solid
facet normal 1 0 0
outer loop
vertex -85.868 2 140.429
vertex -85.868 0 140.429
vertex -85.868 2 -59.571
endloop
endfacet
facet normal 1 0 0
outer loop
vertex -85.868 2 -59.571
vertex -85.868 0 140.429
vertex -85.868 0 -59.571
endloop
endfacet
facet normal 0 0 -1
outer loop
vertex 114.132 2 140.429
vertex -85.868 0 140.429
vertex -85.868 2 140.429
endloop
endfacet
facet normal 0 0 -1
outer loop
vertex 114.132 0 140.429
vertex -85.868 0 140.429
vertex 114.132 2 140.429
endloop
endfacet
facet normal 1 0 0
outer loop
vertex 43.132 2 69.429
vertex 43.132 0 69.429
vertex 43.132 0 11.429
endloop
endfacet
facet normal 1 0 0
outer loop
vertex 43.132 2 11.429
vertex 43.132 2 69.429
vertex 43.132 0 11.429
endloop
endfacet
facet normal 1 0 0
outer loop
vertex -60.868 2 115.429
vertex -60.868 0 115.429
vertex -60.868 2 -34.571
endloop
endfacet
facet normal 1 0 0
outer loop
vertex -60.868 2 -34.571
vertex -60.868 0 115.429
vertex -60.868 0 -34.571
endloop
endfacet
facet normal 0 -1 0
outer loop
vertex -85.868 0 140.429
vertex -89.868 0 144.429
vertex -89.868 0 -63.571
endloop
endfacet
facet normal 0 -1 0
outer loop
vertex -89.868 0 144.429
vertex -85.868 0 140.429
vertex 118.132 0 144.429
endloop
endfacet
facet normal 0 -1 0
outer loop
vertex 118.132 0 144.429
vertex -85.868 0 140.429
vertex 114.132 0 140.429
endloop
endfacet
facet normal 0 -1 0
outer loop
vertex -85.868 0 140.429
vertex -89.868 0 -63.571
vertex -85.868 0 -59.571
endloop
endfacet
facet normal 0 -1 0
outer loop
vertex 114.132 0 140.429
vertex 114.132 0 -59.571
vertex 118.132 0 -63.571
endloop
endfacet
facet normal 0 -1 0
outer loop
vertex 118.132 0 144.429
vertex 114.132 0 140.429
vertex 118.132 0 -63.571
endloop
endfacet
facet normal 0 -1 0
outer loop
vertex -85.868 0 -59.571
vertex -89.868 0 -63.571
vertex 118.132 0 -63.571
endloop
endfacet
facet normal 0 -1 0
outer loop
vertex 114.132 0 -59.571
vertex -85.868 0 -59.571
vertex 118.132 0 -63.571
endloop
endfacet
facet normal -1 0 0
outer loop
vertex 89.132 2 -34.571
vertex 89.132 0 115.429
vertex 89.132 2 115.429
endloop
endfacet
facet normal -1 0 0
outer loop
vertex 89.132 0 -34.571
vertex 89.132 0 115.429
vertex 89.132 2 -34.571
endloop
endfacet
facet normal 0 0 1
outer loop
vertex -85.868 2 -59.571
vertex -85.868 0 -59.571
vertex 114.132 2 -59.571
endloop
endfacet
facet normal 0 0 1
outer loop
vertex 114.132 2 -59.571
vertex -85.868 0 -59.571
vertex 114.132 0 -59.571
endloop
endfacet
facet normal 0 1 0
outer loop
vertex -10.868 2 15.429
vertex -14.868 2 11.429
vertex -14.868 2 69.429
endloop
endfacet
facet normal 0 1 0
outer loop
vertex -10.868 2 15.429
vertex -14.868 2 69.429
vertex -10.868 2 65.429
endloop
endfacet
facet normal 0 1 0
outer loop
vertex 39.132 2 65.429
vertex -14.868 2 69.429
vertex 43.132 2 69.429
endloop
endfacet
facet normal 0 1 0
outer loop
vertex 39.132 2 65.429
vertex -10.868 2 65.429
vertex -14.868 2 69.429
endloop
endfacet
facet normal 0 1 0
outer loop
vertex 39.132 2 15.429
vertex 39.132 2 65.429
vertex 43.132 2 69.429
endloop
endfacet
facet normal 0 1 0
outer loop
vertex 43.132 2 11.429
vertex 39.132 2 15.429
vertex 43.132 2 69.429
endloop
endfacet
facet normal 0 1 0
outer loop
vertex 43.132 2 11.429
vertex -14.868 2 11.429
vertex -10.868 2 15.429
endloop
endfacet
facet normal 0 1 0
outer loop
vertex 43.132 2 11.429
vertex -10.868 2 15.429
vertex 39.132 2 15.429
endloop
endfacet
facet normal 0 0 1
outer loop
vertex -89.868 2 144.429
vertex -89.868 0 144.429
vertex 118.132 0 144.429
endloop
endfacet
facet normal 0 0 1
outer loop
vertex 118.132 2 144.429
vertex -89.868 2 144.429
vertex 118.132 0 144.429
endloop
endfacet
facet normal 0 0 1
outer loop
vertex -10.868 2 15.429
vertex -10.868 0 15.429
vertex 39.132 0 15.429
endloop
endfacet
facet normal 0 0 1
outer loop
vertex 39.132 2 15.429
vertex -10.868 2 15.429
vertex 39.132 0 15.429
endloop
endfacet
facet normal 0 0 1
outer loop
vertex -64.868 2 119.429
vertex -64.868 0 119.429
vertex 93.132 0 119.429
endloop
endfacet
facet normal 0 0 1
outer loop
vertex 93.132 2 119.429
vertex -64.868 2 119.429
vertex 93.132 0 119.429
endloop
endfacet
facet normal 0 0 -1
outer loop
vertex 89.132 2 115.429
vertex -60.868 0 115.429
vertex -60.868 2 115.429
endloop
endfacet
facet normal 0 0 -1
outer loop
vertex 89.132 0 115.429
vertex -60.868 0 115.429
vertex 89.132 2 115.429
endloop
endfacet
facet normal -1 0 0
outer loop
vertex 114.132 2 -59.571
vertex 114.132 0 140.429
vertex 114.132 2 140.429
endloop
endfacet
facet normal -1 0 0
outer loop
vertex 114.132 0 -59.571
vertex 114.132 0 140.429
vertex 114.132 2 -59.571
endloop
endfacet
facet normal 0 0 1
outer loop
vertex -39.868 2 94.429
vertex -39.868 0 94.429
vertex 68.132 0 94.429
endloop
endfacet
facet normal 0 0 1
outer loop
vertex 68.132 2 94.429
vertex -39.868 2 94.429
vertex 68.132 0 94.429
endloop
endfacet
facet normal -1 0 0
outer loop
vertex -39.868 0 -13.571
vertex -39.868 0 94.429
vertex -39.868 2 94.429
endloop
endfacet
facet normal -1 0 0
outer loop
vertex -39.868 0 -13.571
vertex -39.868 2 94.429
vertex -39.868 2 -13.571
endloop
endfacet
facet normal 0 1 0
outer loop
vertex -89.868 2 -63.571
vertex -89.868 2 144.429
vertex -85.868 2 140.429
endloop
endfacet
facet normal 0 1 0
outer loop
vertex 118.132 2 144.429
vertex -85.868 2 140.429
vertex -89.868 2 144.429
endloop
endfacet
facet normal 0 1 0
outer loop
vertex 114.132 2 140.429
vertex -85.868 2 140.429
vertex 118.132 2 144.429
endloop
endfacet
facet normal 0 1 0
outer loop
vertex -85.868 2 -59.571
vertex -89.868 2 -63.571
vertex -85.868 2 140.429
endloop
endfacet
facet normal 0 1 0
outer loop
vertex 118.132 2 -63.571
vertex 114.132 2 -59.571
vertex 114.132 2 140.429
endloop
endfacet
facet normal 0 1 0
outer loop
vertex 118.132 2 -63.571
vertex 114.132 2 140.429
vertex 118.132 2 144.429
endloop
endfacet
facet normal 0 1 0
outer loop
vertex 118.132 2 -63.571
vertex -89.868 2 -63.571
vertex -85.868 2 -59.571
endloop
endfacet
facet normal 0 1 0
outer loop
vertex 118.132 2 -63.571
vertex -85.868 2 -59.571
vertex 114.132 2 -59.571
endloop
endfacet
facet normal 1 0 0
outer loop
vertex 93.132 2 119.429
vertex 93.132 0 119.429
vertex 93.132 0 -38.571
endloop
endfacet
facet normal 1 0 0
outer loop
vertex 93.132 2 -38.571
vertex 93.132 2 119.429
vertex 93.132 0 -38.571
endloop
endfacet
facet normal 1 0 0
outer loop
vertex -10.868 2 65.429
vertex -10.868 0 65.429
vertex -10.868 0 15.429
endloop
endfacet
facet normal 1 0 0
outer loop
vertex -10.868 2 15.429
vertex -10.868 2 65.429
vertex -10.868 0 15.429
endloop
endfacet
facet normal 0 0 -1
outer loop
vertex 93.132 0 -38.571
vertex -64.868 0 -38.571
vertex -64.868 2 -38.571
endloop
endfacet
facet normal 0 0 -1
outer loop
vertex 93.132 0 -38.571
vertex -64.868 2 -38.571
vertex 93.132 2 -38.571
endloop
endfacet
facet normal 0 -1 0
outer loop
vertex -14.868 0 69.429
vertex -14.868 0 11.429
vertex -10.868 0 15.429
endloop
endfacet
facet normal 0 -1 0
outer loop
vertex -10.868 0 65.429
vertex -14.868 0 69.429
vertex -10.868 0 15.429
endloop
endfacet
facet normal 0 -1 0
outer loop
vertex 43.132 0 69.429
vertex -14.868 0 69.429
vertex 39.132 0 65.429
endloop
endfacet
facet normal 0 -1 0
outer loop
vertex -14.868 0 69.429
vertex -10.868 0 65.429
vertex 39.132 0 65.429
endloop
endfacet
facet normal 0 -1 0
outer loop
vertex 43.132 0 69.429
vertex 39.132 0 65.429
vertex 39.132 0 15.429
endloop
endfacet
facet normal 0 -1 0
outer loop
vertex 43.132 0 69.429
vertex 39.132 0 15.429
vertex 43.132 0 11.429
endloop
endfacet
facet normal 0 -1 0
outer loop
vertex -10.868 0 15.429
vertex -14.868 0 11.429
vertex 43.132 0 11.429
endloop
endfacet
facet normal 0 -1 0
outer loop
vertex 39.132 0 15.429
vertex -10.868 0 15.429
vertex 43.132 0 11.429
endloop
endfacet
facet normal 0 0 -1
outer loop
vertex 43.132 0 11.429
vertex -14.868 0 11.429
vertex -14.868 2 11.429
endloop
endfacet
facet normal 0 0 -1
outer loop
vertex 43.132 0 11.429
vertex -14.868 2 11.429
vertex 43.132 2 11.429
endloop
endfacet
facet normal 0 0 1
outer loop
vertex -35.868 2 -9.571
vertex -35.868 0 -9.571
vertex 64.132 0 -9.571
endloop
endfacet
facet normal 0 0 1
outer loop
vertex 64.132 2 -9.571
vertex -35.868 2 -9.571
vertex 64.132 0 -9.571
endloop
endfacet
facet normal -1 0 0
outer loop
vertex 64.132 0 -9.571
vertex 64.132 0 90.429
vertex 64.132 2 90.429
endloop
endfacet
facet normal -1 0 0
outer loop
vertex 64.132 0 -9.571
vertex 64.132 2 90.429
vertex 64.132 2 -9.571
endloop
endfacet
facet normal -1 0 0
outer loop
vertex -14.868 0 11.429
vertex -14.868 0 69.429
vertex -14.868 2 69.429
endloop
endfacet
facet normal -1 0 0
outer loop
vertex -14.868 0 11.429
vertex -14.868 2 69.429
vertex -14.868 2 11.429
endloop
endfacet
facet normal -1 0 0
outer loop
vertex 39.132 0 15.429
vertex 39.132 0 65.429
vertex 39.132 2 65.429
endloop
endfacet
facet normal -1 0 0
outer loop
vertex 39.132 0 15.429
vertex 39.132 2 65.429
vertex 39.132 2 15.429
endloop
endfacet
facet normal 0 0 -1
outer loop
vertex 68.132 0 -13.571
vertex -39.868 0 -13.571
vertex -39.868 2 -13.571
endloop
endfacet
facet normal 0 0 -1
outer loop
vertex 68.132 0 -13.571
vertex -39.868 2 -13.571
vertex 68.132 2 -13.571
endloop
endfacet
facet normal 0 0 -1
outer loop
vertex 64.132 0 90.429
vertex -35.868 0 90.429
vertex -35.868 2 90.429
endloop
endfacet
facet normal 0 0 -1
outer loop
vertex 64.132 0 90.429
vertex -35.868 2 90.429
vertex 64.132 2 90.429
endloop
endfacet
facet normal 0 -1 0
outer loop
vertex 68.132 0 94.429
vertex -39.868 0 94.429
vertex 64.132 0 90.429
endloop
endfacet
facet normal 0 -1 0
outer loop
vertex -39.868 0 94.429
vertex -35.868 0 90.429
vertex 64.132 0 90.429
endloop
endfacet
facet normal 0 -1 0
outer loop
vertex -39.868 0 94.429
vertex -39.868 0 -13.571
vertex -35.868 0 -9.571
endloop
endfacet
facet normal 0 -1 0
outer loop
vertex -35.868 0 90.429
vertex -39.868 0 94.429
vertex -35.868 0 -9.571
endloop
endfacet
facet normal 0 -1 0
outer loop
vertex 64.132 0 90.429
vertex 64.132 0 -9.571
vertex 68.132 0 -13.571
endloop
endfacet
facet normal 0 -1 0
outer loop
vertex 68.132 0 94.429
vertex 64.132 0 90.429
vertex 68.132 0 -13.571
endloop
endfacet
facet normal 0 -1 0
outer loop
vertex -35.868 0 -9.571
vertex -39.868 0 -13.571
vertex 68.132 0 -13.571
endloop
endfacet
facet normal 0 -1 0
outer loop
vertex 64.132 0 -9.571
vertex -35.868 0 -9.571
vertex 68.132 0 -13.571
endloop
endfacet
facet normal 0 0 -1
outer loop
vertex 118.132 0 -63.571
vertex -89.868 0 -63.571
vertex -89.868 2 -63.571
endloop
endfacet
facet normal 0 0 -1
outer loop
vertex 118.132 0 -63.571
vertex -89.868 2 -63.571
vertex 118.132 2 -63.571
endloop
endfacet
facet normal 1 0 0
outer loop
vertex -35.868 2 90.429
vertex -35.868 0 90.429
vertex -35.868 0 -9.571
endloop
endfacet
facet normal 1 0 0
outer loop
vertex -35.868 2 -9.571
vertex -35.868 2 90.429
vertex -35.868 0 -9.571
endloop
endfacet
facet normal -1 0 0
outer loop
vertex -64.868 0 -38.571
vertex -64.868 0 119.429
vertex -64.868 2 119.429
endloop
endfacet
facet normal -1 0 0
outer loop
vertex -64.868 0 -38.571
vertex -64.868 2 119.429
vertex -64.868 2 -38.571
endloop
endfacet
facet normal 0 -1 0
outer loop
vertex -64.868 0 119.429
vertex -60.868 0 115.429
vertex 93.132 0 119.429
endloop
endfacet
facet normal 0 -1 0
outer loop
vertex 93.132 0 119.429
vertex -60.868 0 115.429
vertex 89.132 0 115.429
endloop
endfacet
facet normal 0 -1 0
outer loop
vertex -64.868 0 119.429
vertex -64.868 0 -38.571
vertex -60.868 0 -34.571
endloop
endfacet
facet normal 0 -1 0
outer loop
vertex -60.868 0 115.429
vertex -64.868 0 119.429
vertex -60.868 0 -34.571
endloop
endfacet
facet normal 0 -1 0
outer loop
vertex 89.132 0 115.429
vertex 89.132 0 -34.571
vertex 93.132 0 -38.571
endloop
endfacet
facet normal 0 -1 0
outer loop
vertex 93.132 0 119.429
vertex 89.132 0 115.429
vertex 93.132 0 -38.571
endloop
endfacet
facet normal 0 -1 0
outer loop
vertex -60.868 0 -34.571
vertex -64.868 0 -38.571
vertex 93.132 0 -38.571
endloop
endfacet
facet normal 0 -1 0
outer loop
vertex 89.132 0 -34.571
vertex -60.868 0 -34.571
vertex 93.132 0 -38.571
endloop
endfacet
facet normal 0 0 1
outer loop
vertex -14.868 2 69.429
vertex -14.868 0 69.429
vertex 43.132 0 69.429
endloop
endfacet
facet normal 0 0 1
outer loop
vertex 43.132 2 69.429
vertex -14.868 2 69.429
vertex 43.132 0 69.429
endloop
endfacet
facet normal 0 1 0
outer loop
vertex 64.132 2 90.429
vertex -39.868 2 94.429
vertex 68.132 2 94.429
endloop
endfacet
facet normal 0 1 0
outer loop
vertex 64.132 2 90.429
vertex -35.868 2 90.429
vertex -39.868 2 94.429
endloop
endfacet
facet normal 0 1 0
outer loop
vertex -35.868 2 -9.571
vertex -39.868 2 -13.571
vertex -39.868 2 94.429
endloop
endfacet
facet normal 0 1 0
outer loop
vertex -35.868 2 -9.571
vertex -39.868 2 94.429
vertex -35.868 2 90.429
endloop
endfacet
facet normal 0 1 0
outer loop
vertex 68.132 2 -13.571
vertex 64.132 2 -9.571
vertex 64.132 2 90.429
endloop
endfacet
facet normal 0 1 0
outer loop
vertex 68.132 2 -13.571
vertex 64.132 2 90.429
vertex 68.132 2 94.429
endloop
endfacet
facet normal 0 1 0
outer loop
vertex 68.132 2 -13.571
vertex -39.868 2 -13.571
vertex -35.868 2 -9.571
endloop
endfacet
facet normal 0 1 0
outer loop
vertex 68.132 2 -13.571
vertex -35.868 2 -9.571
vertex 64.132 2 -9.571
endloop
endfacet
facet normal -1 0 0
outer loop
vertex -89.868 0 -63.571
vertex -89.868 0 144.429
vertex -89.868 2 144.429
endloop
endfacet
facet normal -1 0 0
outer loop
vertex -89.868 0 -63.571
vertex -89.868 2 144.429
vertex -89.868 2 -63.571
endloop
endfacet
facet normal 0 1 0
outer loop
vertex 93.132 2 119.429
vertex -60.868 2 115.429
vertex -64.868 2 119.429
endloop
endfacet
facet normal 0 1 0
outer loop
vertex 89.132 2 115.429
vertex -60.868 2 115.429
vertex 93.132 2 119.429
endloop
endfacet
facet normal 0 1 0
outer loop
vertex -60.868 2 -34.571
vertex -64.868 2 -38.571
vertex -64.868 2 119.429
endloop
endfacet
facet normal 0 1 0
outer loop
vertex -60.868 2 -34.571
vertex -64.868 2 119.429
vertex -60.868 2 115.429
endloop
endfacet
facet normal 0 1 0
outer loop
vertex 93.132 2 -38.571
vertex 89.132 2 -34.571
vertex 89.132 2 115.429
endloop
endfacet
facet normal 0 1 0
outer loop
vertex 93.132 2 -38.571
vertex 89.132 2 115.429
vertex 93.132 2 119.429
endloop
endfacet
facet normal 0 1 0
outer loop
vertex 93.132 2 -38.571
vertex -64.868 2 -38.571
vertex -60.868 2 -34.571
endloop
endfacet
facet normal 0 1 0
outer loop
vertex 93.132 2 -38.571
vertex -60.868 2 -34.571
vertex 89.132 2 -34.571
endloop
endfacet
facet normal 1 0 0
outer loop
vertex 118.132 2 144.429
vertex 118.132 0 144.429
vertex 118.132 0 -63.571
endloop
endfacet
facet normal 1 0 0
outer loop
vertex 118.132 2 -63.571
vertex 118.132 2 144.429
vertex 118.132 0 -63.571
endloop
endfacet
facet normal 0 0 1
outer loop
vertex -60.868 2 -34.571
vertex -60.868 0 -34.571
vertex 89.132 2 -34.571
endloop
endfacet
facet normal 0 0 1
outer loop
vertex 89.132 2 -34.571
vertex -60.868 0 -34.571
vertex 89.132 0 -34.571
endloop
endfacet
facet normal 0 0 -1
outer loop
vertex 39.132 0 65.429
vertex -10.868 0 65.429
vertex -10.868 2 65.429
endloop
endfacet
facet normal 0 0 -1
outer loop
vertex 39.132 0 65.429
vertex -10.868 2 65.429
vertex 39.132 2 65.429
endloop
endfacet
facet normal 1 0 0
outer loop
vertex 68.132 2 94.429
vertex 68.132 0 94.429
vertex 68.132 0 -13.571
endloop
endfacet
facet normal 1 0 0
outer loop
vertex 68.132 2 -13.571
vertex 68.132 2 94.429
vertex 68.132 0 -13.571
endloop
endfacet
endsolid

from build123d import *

# Parameters (mm, degrees)
SKETCH1_W             = 208
SKETCH1_H             = 208
SKETCH1_W_2           = 200
SKETCH1_H_2           = 200
EXTRUDE_THIN1_DEPTH   = 2
SKETCH1_W_3           = 158
SKETCH1_H_3           = 158
SKETCH1_W_4           = 150
SKETCH1_H_4           = 150
EXTRUDE_THIN1_2_DEPTH = 2
SKETCH1_W_5           = 108
SKETCH1_H_5           = 108
SKETCH1_W_6           = 100
SKETCH1_H_6           = 100
EXTRUDE_THIN1_3_DEPTH = 2
SKETCH1_W_7           = 58
SKETCH1_H_7           = 58
SKETCH1_W_8           = 50
SKETCH1_H_8           = 50
EXTRUDE_THIN1_4_DEPTH = 2


with BuildPart() as part:
    # Sketch1 → Extrude-Thin1 (new body)
    with BuildSketch(Plane(origin=(0, 0, 0), x_dir=(1, 0, 0), z_dir=(0, 1, 0))):
        with Locations((14.132379249, -40.429338104)):
            Rectangle(SKETCH1_W, SKETCH1_H)
        with Locations((14.132379249, -40.429338104)):
            Rectangle(SKETCH1_W_2, SKETCH1_H_2, mode=Mode.SUBTRACT)
    extrude(amount=EXTRUDE_THIN1_DEPTH)


with BuildPart() as body_2:
    # Sketch1 → Extrude-Thin1 2 (new body)
    with BuildSketch(Plane(origin=(0, 0, 0), x_dir=(1, 0, 0), z_dir=(0, 1, 0))):
        with Locations((14.132379249, -40.429338104)):
            Rectangle(SKETCH1_W_3, SKETCH1_H_3)
        with Locations((14.132379249, -40.429338104)):
            Rectangle(SKETCH1_W_4, SKETCH1_H_4, mode=Mode.SUBTRACT)
    extrude(amount=EXTRUDE_THIN1_2_DEPTH)


with BuildPart() as body_3:
    # Sketch1 → Extrude-Thin1 3 (new body)
    with BuildSketch(Plane(origin=(0, 0, 0), x_dir=(1, 0, 0), z_dir=(0, 1, 0))):
        with Locations((14.132379249, -40.429338104)):
            Rectangle(SKETCH1_W_5, SKETCH1_H_5)
        with Locations((14.132379249, -40.429338104)):
            Rectangle(SKETCH1_W_6, SKETCH1_H_6, mode=Mode.SUBTRACT)
    extrude(amount=EXTRUDE_THIN1_3_DEPTH)


with BuildPart() as body_4:
    # Sketch1 → Extrude-Thin1 4 (new body)
    with BuildSketch(Plane(origin=(0, 0, 0), x_dir=(1, 0, 0), z_dir=(0, 1, 0))):
        with Locations((14.132379249, -40.429338104)):
            Rectangle(SKETCH1_W_7, SKETCH1_H_7)
        with Locations((14.132379249, -40.429338104)):
            Rectangle(SKETCH1_W_8, SKETCH1_H_8, mode=Mode.SUBTRACT)
    extrude(amount=EXTRUDE_THIN1_4_DEPTH)


solid = Compound([part.part, body_2.part, body_3.part, body_4.part])
